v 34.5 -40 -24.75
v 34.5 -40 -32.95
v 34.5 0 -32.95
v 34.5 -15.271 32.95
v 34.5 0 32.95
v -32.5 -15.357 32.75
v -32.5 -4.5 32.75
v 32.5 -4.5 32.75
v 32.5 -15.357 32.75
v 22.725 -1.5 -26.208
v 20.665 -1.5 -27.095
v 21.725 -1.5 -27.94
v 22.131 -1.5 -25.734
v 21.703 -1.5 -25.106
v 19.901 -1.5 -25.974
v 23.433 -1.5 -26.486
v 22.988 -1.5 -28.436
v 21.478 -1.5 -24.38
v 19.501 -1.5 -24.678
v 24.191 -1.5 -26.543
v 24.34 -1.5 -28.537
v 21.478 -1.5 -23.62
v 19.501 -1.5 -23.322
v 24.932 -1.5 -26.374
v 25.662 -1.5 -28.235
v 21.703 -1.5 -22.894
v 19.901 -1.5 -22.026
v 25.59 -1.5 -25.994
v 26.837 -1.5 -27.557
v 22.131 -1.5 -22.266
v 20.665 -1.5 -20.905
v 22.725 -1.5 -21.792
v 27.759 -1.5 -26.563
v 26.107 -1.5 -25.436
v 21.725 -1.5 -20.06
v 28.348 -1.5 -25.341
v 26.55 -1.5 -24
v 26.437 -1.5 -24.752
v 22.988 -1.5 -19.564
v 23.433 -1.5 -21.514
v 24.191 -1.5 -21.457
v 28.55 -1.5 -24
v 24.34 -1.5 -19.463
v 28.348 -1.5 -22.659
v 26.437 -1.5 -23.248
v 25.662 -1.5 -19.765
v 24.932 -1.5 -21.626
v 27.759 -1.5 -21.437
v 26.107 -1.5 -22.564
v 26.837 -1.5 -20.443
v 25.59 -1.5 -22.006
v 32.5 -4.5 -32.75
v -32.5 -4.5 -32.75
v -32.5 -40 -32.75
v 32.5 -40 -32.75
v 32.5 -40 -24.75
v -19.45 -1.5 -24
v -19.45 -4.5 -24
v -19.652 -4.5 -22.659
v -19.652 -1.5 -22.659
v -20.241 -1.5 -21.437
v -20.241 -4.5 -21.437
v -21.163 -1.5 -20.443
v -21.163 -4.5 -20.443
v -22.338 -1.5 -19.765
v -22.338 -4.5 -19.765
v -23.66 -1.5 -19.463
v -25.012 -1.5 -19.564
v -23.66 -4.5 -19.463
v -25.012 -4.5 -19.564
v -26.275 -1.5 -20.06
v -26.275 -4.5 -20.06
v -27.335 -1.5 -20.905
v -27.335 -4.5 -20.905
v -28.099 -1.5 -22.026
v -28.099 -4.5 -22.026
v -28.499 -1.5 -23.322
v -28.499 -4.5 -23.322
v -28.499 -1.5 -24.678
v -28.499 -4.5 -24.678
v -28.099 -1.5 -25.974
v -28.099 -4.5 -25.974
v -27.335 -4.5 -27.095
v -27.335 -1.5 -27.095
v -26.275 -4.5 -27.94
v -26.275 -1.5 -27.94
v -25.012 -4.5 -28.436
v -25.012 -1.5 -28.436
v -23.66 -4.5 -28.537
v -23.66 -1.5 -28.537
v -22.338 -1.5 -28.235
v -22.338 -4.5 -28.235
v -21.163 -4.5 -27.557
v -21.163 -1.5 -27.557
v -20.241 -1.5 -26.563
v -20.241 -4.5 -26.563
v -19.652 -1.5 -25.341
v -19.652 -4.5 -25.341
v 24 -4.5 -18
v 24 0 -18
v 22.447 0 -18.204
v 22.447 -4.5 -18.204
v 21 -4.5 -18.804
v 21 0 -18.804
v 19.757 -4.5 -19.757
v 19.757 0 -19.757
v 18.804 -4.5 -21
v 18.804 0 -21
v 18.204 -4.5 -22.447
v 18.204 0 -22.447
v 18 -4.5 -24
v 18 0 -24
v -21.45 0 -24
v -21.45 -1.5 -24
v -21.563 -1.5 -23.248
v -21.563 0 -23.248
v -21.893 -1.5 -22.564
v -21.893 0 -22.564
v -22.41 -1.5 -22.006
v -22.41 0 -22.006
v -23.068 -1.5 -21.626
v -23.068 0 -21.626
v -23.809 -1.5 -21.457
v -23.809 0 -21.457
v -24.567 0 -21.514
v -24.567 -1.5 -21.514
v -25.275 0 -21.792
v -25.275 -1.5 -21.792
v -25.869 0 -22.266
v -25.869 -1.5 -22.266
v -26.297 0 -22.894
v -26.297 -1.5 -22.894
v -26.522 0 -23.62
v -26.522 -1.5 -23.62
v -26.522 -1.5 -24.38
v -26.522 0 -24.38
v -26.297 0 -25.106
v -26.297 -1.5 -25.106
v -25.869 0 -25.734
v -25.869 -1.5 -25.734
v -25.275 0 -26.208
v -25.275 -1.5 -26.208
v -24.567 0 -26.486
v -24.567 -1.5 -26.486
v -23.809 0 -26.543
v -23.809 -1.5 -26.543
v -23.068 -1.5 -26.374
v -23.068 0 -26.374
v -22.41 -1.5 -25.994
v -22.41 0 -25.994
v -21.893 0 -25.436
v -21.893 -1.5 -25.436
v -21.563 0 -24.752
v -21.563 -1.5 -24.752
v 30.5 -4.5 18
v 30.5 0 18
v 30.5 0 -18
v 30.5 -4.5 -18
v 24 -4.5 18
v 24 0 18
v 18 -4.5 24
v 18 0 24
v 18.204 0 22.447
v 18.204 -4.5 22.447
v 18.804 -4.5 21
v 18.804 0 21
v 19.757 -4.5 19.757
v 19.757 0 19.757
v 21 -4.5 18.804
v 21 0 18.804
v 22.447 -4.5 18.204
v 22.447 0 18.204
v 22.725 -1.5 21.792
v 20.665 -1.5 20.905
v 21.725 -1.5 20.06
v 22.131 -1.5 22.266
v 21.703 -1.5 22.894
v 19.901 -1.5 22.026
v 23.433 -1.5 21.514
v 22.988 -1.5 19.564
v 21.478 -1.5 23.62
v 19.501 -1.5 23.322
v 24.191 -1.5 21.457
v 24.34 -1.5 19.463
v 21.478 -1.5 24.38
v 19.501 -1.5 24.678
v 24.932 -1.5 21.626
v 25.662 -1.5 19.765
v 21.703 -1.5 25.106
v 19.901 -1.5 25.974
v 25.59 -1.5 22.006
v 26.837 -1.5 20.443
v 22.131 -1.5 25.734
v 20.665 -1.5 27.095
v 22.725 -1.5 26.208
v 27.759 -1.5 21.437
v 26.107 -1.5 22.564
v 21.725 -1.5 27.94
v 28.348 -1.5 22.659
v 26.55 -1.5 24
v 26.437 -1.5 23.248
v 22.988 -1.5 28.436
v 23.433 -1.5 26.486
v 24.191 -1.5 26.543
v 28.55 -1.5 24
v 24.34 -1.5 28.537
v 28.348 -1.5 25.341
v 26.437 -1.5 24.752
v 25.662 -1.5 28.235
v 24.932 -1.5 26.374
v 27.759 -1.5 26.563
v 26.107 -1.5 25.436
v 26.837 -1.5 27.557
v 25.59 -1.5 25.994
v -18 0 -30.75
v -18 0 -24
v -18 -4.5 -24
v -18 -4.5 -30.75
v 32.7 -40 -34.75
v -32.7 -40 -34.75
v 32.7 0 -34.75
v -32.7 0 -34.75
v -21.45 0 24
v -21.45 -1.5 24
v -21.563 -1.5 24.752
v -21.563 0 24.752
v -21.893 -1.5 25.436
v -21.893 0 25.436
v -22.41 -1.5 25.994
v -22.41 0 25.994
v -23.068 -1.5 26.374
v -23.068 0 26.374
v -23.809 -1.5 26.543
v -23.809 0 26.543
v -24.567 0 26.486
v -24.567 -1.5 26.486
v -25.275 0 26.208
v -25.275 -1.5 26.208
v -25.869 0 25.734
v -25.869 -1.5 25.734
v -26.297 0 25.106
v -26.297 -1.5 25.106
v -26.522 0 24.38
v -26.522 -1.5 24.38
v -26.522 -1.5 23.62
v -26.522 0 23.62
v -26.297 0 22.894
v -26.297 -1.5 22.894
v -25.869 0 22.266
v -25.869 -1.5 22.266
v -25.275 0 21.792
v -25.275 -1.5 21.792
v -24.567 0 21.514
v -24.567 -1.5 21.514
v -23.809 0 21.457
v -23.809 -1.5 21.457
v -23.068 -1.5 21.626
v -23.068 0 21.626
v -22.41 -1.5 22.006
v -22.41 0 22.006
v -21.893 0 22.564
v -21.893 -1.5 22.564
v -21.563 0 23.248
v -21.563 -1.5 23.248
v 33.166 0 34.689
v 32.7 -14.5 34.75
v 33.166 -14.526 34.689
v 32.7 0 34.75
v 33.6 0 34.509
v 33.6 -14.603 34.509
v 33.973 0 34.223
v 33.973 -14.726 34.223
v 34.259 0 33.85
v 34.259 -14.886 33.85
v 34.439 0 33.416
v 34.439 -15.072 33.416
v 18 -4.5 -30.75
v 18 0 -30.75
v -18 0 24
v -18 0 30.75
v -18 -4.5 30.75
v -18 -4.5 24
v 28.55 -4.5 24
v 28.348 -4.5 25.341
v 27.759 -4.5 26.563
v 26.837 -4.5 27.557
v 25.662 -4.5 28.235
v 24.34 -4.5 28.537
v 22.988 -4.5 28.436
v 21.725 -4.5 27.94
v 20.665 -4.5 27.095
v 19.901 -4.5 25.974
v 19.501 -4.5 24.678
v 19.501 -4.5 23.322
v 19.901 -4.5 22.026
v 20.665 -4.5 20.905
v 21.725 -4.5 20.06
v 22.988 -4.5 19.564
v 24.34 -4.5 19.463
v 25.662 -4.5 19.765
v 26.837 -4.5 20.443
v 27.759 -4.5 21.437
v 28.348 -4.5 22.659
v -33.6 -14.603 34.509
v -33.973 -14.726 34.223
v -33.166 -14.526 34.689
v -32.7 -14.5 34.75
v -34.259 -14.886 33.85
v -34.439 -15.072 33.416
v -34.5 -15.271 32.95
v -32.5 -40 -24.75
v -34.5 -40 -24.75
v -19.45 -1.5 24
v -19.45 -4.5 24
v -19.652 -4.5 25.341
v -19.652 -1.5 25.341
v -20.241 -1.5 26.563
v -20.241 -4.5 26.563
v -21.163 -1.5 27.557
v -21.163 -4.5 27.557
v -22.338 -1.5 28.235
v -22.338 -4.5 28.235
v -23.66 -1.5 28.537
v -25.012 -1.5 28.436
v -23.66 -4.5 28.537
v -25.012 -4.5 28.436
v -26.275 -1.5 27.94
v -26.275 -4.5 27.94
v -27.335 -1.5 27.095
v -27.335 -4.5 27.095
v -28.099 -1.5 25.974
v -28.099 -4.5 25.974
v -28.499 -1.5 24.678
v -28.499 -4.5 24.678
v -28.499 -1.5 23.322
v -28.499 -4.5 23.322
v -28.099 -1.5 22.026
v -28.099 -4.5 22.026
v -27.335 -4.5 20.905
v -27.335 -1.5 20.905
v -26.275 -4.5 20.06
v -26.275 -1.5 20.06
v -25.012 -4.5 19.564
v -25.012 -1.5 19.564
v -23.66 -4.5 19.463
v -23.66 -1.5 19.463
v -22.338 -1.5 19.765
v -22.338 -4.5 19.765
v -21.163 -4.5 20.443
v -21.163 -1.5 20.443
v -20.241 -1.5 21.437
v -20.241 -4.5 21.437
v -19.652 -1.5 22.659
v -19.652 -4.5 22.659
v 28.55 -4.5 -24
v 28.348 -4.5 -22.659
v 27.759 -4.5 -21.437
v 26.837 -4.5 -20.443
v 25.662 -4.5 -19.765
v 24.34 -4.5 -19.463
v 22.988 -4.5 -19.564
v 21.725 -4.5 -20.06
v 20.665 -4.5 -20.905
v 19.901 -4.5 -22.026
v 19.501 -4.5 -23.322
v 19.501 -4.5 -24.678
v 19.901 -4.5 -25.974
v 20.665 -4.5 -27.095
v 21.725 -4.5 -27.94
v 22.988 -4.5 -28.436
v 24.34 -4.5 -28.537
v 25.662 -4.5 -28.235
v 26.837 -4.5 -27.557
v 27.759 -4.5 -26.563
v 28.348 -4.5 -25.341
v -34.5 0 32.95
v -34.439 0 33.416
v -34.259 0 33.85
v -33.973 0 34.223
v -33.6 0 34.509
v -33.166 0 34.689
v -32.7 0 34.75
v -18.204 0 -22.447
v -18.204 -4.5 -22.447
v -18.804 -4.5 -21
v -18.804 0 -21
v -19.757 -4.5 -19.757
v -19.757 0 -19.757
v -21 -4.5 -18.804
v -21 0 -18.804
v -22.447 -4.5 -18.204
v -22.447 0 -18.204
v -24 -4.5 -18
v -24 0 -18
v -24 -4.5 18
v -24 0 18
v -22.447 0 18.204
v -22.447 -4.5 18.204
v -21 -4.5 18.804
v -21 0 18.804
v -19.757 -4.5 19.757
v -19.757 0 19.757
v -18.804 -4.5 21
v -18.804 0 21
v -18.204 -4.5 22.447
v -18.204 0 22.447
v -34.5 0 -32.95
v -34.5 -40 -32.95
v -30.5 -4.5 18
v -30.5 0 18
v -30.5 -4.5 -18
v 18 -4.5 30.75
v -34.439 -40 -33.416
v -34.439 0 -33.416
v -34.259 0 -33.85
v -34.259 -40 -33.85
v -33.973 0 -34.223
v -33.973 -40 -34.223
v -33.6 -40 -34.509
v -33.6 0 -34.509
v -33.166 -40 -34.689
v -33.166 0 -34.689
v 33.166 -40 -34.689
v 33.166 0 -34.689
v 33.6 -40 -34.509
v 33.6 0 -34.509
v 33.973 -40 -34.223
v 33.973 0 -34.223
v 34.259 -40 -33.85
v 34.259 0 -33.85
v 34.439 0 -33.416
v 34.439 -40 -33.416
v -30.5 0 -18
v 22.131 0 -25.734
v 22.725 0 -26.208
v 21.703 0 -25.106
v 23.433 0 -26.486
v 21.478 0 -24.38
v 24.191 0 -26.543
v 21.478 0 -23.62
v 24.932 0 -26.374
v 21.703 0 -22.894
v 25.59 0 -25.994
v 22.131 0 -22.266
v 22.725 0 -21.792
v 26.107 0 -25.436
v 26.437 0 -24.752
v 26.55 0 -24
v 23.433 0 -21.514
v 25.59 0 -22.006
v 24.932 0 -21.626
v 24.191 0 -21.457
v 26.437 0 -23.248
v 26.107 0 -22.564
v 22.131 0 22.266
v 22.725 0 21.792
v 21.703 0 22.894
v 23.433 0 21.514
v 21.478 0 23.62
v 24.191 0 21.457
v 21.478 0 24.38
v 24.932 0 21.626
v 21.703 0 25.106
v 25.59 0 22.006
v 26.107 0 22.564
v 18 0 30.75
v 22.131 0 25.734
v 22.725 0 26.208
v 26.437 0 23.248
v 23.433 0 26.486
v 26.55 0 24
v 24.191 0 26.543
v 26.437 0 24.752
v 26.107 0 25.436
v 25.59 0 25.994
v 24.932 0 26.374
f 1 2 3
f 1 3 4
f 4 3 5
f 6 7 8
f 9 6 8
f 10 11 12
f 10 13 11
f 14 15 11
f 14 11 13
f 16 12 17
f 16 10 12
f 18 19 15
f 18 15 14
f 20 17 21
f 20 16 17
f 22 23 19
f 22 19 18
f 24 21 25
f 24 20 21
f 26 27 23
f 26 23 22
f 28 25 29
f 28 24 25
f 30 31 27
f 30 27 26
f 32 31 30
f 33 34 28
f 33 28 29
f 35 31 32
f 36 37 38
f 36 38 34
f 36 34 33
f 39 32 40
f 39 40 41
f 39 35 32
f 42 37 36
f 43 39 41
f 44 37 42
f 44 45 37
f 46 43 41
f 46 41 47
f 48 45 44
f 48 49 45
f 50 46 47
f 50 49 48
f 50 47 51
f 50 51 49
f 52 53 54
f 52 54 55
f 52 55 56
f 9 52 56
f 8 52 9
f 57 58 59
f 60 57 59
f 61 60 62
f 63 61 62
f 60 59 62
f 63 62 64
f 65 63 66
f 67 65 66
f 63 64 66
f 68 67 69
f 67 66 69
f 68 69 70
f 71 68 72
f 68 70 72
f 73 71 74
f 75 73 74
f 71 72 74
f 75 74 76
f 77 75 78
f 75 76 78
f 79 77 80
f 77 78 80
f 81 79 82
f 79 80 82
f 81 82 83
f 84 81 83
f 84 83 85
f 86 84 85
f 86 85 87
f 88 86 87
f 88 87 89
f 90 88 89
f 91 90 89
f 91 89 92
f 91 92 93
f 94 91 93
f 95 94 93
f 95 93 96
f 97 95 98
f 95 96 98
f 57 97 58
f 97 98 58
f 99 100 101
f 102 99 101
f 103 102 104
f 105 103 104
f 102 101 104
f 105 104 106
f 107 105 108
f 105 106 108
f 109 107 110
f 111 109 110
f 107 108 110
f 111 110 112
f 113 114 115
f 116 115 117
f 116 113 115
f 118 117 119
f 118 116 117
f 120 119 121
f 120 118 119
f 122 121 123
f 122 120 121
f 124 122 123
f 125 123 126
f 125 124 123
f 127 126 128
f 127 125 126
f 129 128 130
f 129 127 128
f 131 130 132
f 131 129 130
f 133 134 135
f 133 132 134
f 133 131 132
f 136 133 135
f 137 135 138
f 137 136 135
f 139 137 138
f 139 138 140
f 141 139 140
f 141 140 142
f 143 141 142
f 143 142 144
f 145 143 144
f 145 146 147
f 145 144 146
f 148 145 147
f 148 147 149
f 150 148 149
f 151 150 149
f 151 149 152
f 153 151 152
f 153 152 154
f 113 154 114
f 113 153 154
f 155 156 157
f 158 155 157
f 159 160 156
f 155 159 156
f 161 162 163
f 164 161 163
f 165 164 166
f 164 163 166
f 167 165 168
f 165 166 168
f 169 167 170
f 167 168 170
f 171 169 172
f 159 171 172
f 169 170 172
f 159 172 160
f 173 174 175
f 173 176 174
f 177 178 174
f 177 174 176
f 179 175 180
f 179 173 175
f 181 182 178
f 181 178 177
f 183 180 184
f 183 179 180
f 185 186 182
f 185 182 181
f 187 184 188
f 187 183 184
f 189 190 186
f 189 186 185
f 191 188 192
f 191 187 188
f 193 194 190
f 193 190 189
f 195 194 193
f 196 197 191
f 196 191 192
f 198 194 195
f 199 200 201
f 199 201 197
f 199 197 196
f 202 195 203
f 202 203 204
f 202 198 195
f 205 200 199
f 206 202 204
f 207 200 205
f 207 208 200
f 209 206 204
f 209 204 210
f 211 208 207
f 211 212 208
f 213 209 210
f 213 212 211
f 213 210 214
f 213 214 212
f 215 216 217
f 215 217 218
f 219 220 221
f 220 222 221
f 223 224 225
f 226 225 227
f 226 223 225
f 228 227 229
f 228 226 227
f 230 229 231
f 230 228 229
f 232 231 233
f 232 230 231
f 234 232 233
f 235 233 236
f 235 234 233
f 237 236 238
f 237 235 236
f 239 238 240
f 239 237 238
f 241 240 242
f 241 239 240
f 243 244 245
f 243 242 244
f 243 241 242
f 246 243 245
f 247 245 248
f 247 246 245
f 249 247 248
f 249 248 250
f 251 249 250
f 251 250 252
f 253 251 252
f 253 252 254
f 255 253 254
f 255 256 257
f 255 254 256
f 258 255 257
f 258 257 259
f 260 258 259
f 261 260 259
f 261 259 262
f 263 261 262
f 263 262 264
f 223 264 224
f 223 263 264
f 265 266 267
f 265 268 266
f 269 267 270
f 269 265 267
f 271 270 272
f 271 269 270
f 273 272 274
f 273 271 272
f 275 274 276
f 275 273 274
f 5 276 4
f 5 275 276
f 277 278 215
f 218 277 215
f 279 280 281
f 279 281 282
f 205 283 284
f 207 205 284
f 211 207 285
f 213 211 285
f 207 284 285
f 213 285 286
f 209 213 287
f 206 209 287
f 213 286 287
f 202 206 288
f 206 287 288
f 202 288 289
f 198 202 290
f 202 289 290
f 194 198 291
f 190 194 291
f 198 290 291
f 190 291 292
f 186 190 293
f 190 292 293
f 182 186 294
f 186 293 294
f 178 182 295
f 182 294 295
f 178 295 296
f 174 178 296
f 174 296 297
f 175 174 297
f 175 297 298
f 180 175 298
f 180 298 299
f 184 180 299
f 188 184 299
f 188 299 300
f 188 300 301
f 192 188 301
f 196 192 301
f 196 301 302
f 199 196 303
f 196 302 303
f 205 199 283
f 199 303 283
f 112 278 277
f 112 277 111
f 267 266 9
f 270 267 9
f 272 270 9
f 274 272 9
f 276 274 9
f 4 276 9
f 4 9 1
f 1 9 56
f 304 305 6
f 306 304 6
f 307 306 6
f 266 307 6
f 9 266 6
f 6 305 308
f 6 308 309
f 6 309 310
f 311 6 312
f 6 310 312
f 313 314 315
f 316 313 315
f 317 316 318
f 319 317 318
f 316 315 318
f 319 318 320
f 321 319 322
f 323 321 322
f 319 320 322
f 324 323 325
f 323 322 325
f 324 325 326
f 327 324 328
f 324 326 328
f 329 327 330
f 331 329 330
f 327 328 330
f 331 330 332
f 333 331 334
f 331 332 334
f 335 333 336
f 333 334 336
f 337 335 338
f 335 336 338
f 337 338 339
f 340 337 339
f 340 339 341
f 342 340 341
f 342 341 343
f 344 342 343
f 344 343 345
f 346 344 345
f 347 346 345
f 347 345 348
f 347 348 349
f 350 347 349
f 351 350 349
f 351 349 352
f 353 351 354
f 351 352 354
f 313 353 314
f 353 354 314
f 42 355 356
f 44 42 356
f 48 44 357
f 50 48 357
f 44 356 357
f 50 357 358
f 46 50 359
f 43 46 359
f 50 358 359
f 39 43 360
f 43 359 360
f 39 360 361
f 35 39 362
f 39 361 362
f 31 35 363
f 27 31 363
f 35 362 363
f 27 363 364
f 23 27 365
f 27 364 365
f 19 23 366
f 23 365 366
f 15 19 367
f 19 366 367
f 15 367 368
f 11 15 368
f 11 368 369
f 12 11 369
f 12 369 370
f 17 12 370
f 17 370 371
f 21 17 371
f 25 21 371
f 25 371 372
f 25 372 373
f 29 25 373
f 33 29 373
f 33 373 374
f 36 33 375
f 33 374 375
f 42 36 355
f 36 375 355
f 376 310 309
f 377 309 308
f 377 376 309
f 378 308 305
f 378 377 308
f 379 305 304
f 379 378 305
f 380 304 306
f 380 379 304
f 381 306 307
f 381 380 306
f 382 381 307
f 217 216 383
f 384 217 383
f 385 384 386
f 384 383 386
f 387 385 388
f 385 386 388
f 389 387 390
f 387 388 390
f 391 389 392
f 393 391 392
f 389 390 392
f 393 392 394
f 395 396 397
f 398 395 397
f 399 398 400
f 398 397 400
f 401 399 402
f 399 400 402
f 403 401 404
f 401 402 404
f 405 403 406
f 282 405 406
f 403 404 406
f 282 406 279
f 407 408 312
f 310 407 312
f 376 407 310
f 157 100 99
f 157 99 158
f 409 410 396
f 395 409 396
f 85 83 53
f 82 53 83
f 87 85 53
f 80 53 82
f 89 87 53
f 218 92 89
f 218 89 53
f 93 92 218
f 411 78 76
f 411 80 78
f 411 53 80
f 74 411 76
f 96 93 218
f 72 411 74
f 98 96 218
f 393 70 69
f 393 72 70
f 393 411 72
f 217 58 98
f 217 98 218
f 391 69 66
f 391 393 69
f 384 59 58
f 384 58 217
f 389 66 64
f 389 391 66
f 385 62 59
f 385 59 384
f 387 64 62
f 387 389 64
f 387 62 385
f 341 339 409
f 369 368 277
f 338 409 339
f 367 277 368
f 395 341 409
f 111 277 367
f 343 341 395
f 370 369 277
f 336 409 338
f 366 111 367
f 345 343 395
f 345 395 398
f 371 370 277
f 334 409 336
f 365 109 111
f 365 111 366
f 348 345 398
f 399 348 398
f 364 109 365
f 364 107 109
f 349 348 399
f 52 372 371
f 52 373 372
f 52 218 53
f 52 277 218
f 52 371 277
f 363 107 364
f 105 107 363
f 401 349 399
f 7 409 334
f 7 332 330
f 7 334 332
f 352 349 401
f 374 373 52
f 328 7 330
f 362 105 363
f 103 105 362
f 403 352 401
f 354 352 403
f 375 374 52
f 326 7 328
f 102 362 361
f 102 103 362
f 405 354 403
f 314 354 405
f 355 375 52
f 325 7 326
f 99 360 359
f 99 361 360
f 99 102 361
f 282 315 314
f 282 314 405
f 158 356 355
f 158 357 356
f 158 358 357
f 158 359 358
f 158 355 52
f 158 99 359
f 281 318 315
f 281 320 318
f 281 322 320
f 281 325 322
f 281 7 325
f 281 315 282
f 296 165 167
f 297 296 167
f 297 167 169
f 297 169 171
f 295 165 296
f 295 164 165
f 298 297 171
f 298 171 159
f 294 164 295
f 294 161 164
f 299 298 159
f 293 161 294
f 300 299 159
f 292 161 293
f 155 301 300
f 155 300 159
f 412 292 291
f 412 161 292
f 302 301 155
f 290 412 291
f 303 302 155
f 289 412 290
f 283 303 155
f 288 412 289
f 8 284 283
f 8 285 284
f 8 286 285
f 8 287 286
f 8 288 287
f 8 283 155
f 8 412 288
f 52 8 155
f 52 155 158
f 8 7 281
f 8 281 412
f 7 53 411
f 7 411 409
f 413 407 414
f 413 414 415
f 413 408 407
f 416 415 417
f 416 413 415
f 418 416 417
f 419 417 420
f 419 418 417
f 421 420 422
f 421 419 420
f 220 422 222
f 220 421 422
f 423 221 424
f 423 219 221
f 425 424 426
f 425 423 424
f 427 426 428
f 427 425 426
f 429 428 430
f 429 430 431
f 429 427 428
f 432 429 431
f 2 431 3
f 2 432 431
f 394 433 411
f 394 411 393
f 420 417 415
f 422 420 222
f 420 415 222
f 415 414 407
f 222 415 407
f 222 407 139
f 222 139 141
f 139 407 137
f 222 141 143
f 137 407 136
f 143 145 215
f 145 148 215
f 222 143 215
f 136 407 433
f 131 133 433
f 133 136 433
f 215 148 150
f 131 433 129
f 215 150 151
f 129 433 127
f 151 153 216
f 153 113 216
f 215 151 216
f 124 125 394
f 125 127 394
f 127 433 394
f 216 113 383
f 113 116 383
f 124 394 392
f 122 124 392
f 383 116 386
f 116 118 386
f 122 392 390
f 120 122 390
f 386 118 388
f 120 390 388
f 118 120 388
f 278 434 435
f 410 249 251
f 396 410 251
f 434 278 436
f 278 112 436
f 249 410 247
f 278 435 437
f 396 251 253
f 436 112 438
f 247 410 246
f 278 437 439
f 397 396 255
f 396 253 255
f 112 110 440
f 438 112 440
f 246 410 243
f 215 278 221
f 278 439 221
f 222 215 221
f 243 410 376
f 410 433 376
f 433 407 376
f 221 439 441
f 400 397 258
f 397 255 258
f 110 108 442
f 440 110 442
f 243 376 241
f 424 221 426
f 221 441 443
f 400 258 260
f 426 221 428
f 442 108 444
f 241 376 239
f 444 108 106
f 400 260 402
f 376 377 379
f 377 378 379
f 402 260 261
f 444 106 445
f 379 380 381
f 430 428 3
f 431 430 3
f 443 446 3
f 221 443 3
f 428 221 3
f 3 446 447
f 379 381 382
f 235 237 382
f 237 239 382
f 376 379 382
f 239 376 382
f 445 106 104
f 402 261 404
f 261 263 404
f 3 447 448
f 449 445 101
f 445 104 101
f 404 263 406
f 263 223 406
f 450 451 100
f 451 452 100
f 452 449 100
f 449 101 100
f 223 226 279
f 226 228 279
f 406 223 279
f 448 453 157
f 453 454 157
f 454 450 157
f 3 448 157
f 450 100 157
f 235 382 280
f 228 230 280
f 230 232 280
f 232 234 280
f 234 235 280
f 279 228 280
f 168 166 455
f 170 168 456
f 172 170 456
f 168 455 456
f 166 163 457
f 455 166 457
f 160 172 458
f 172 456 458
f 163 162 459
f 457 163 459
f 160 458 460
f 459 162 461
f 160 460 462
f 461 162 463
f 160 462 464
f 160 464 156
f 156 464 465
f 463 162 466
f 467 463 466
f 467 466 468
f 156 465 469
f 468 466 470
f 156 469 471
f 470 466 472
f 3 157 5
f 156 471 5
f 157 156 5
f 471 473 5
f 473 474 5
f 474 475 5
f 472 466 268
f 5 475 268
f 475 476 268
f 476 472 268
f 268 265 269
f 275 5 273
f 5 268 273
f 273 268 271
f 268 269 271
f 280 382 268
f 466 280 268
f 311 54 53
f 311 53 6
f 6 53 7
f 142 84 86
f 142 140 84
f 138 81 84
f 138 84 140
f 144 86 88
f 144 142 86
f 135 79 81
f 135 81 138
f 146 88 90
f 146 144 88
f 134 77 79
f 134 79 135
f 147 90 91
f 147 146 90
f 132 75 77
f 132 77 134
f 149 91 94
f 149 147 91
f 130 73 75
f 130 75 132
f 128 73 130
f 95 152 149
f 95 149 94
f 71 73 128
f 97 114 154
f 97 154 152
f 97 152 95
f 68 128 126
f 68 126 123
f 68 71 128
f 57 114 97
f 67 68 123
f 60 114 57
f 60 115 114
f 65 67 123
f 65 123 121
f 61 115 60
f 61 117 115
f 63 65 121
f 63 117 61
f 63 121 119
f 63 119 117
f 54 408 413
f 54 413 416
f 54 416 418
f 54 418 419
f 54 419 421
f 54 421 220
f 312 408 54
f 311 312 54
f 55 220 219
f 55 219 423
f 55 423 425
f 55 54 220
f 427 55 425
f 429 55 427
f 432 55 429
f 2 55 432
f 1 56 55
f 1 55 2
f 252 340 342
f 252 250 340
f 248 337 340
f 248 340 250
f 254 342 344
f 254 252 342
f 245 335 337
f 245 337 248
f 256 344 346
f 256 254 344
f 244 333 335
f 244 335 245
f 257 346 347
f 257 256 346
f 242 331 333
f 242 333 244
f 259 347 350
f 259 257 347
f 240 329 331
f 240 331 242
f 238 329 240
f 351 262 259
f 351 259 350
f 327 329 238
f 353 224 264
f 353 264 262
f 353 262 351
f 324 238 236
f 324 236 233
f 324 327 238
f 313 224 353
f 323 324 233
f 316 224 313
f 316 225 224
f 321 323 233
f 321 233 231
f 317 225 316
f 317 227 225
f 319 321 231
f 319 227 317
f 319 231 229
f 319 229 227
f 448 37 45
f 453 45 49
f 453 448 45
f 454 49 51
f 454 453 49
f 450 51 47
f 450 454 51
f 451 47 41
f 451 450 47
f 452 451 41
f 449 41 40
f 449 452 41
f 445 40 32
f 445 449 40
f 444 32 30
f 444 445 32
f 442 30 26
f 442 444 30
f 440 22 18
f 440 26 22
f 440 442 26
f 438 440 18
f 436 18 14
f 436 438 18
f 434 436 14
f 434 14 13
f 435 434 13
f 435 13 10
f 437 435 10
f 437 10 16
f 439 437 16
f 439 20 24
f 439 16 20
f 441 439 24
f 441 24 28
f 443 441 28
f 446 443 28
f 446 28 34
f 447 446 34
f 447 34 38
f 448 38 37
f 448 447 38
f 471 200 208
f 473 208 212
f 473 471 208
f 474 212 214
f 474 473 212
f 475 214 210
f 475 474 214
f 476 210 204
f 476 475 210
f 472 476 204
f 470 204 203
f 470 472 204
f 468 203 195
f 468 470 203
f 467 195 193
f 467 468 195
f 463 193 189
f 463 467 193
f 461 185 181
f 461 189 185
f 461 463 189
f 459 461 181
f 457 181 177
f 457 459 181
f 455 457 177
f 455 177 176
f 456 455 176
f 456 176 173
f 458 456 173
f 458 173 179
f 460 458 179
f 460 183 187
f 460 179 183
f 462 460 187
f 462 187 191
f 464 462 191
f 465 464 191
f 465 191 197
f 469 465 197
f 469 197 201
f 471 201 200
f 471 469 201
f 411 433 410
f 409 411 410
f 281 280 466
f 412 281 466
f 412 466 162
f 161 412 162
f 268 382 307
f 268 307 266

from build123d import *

# Parameters (mm, degrees)
SKETCH_W        = 69
SKETCH_H        = 69.5
SKETCH_R        = 2.55
PAD_DEPTH       = 4.5
SKETCH001_W     = 69
SKETCH001_H     = 69.5
SKETCH001_W_2   = 65
SKETCH001_H_2   = 65.5
PAD001_DEPTH    = 40
POCKET_DEPTH    = 69.001
SKETCH003_R     = 4.55
POCKET001_DEPTH = 3
FILLET_R        = 1.8


with BuildPart() as part:
    # Sketch → Pad (new body)
    with BuildSketch(Plane.XZ):
        Rectangle(SKETCH_W, SKETCH_H)
        with Locations((-24, 24)):
            Circle(SKETCH_R, mode=Mode.SUBTRACT)
        with Locations((24, 24)):
            Circle(SKETCH_R, mode=Mode.SUBTRACT)
        with Locations((-24, -24)):
            Circle(SKETCH_R, mode=Mode.SUBTRACT)
        with Locations((24, -24)):
            Circle(SKETCH_R, mode=Mode.SUBTRACT)
        with BuildLine():
            Line((-18, 30.75), (18, 30.75))
            Line((18, 30.75), (18, 24))
            ThreePointArc((18, 24), (19.757359, 19.757359), (24, 18))
            Line((24, 18), (30.5, 18))
            Line((30.5, 18), (30.5, -18))
            Line((23.999998, -18), (30.5, -18))
            ThreePointArc((23.999998, -18), (19.757359, -19.75736), (18, -24))
            Line((18, -30.75), (18, -24))
            Line((18, -30.75), (-18, -30.75))
            Line((-18, -24), (-18, -30.75))
            ThreePointArc((-18, -24), (-19.757359, -19.757359), (-24, -18))
            Line((-30.5, -18), (-24, -18))
            Line((-30.5, -18), (-30.5, 18))
            Line((-30.5, 18), (-24, 18))
            ThreePointArc((-24, 18), (-19.757359, 19.757359), (-18, 24))
            Line((-18, 30.75), (-18, 24))
        make_face(mode=Mode.SUBTRACT)
    extrude(amount=PAD_DEPTH)

    # Sketch001 → Pad001 (join)
    with BuildSketch(Plane.XZ):
        Rectangle(SKETCH001_W, SKETCH001_H)
        Rectangle(SKETCH001_W_2, SKETCH001_H_2, mode=Mode.SUBTRACT)
    extrude(amount=PAD001_DEPTH)

    # Sketch002 (on Face7 of Pad001) → Pocket (cut, through all)
    with BuildSketch(Plane(origin=(-34.5, 0, 0), x_dir=(0, 0, -1), z_dir=(-1, 0, 0))):
        Polygon((-34.75, 14.5), (24.75, 40), (-34.75, 40), align=None)
    extrude(amount=-POCKET_DEPTH, mode=Mode.SUBTRACT)

    # Sketch003 (on Face37 of Pocket) → Pocket001 (cut)
    with BuildSketch(Plane.XZ.offset(4.5)):
        with Locations((-24, 24)):
            Circle(SKETCH003_R)
        with Locations((24, 24)):
            Circle(SKETCH003_R)
        with Locations((-24, -24)):
            Circle(SKETCH003_R)
        with Locations((24, -24)):
            Circle(SKETCH003_R)
    extrude(amount=-POCKET001_DEPTH, mode=Mode.SUBTRACT)

    # Fillet
    fillet_edges = [part.edges().sort_by_distance(p)[0] for p in [
        (-34.5, -9.5, 34.75),
        (-34.5, -2.25, 34.75),
        (-34.5, -2.25, -34.75),
        (-34.5, -22.25, -34.75),
        (34.5, -22.25, -34.75),
        (34.5, -2.25, -34.75),
        (34.5, -9.5, 34.75),
        (34.5, -2.25, 34.75),
    ]]
    fillet(fillet_edges, radius=FILLET_R)


solid = part.part
